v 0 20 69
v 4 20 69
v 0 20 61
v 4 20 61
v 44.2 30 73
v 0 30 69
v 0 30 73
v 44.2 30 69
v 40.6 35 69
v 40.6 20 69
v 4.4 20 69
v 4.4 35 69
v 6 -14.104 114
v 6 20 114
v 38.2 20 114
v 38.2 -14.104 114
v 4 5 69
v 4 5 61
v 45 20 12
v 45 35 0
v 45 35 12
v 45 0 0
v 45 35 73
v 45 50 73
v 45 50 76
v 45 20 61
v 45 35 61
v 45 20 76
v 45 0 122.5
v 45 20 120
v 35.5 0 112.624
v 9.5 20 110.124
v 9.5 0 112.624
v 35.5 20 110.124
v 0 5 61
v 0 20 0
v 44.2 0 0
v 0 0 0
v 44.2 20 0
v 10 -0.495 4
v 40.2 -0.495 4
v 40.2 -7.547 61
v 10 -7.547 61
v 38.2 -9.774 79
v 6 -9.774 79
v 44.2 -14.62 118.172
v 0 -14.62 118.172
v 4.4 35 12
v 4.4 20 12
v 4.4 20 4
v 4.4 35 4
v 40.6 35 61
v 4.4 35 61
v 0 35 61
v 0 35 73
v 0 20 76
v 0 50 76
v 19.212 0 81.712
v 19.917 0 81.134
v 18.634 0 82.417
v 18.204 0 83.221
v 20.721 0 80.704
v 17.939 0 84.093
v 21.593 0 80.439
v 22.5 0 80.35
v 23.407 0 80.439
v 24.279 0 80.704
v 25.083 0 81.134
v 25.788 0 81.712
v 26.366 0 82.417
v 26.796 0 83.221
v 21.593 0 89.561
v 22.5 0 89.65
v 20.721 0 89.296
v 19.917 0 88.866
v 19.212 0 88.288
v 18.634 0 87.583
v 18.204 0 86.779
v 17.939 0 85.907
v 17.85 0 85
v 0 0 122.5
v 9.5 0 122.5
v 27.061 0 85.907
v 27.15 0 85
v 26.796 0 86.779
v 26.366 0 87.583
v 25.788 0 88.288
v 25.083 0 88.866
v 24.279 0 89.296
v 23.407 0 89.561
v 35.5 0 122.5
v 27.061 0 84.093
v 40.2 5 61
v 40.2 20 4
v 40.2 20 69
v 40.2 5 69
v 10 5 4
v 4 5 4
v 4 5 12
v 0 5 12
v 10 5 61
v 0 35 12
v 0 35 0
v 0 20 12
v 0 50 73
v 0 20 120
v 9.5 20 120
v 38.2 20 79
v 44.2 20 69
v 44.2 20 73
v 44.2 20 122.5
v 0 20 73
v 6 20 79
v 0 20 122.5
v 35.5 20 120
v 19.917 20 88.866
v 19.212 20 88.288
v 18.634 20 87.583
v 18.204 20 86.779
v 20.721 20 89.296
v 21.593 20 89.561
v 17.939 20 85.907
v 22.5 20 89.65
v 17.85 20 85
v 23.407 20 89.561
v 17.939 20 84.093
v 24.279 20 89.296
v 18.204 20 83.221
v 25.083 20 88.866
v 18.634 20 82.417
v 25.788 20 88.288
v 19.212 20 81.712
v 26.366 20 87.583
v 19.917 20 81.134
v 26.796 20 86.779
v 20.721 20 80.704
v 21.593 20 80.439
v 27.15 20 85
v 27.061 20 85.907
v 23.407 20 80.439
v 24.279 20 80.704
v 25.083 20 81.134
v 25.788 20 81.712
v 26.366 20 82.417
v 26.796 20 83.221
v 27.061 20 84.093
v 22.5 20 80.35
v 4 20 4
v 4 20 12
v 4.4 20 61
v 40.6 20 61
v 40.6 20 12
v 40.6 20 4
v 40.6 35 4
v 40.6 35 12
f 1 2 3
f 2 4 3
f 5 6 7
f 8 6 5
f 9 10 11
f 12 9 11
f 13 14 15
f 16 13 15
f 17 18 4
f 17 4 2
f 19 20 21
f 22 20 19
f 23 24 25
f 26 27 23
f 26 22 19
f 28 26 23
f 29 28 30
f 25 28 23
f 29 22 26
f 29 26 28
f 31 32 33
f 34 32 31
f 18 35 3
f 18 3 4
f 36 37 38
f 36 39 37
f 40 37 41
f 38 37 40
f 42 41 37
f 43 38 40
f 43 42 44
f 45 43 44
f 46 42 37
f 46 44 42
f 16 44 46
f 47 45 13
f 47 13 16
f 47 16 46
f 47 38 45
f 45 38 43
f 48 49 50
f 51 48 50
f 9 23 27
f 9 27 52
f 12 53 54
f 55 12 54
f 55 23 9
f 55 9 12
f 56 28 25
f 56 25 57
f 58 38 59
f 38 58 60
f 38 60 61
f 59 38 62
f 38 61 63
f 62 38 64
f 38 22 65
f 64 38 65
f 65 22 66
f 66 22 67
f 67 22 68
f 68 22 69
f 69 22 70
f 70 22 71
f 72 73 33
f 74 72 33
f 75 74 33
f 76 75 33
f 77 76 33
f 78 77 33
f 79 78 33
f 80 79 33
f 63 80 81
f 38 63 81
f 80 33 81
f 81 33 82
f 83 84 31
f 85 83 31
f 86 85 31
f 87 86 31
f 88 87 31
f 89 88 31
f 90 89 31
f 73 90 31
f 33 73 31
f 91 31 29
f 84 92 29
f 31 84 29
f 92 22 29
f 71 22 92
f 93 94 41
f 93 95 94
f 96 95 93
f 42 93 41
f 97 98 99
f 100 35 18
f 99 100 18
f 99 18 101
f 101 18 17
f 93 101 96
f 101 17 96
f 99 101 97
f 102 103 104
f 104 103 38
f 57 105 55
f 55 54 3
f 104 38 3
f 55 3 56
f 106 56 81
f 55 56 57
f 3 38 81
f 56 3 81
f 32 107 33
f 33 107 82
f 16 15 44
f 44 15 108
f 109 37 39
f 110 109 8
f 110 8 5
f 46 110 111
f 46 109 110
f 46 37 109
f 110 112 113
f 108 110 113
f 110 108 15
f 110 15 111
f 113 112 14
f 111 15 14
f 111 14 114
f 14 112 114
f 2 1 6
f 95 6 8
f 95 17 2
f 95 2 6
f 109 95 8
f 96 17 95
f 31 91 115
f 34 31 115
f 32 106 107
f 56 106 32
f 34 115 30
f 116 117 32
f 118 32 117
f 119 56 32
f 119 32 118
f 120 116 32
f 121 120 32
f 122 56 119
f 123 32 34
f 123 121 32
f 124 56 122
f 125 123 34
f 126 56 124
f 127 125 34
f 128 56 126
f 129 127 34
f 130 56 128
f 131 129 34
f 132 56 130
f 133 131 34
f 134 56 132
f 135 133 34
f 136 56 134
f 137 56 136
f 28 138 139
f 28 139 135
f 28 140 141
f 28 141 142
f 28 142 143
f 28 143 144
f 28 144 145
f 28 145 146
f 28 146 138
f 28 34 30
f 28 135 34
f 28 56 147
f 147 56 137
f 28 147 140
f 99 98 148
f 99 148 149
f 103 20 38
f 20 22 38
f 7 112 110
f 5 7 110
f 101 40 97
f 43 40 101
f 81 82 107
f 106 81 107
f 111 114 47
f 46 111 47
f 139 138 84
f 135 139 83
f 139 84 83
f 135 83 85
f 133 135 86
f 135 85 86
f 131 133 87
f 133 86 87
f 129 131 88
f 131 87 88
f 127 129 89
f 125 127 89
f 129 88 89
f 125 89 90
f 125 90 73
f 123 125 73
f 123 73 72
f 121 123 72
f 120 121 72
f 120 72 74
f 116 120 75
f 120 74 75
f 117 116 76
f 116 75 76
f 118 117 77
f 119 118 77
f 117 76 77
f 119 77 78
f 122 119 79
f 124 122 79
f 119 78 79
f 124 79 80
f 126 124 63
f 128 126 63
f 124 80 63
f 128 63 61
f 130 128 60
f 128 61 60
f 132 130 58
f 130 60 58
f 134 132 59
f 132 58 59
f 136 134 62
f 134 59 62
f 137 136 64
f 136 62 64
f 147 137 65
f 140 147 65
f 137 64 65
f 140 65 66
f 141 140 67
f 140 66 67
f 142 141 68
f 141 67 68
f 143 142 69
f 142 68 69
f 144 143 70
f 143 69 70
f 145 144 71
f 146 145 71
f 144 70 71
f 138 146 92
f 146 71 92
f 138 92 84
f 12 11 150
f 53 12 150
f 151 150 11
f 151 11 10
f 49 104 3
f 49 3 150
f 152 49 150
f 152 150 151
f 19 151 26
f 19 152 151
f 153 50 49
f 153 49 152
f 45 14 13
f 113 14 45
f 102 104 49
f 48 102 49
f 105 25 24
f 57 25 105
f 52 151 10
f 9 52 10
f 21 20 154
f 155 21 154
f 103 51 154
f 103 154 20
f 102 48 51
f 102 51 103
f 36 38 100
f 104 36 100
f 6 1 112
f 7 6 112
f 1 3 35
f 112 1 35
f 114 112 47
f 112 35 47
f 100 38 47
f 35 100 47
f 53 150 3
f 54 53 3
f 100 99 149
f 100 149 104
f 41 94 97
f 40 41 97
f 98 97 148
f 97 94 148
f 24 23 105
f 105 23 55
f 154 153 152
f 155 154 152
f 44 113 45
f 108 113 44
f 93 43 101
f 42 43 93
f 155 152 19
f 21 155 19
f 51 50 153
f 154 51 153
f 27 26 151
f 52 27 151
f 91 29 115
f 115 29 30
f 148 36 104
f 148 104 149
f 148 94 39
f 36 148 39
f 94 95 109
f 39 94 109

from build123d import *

# Parameters (mm, degrees)
SKETCH_W        = 45
SKETCH_H        = 20
PAD_DEPTH       = 120
PAD001_DEPTH    = 45
SKETCH002_R     = 4.65
POCKET_DEPTH    = 20
PAD002_DEPTH    = 15
PAD003_DEPTH    = 15
POCKET001_DEPTH = 9.8
SKETCH019_W     = 45
SKETCH019_H     = 3
PAD016_DEPTH    = 30
SKETCH005_W     = 10
SKETCH005_H     = 73
PAD004_DEPTH    = 5
PAD005_DEPTH    = 15
PAD006_DEPTH    = 5
PAD007_DEPTH    = 15
PAD008_DEPTH    = 5
SKETCH008_W     = 44.2
SKETCH008_H     = 4
PAD009_DEPTH    = 10
SKETCH009_W     = 30.2
SKETCH009_H     = 5
PAD010_DEPTH    = 8
SKETCH011_W     = 4
SKETCH011_H     = 5
PAD011_DEPTH    = 49
SKETCH013_W     = 4
SKETCH013_H     = 15
PAD012_DEPTH    = 49
SKETCH014_W     = 44.2
SKETCH014_H     = 20
PAD013_DEPTH    = 47
PAD014_DEPTH    = 44.2
PAD015_DEPTH    = 44.2
SKETCH017_W     = 30.2
SKETCH017_H     = 57
POCKET002_DEPTH = 10
SKETCH018_W     = 32.2
SKETCH018_H     = 35
POCKET003_DEPTH = 50


with BuildPart() as body:
    # Sketch → Pad (new body)
    with BuildSketch(Plane.XY):
        with Locations((22.5, 10)):
            Rectangle(SKETCH_W, SKETCH_H)
    extrude(amount=PAD_DEPTH)

    # Sketch001 (on Face2 of Pad) → Pad001 (join)
    with BuildSketch(Plane.YZ.offset(45)):
        Polygon((0, 120), (0, 122.5), (20, 120), align=None)
    extrude(amount=-PAD001_DEPTH)

    # Sketch002 (on Face6 of Pad001) → Pocket (cut)
    with BuildSketch(Plane.XZ):
        with Locations((22.5, 85)):
            Circle(SKETCH002_R)
    extrude(amount=-POCKET_DEPTH, mode=Mode.SUBTRACT)

    # Sketch003 (on Face1 of Pocket) → Pad002 (join)
    with BuildSketch(Plane(origin=(0, 20, 0), x_dir=(-1, 0, 0), z_dir=(0, 1, 0))):
        Polygon((-4.4, 4), (-40.6, 4), (-40.6, 12), (-45, 12), (-45, 0), (0, 0), (0, 12), (-4.4, 12), align=None)
    extrude(amount=PAD002_DEPTH)

    # Sketch004 (on Face1 of Pad002) → Pad003 (join)
    with BuildSketch(Plane(origin=(0, 20, 0), x_dir=(-1, 0, 0), z_dir=(0, 1, 0))):
        Polygon((0, 73), (-45, 73), (-45, 61), (-40.6, 61), (-40.6, 69), (-4.4, 69), (-4.4, 61), (0, 61), align=None)
    extrude(amount=PAD003_DEPTH)

    # Sketch010 (on Face27 of Pad003) → Pocket001 (cut)
    with BuildSketch(Plane(origin=(0, 15.0769230769, 120.6153846154), x_dir=(1, 0, 0), z_dir=(0, 0.1240347346, 0.9922778767))):
        Polygon((9.5, 4.9613893836), (9.5, -15.1942549872), (35.5, -15.1942549872), (35.5, 4.9613893836), (35.5, 6.9613893836), (9.5, 6.9613893836), align=None)
    extrude(amount=-POCKET001_DEPTH, mode=Mode.SUBTRACT)

    # Sketch019 (on Face17 of Pocket001) → Pad016 (join)
    with BuildSketch(Plane(origin=(0, 20, 0), x_dir=(-1, 0, 0), z_dir=(0, 1, 0))):
        with Locations((-22.5, 74.5)):
            Rectangle(SKETCH019_W, SKETCH019_H)
    extrude(amount=PAD016_DEPTH)


with BuildPart() as batteryrearmotorholder001:
    # Sketch005 → Pad004 (new body)
    with BuildSketch(Plane.XZ):
        with Locations((5, 36.5)):
            Rectangle(SKETCH005_W, SKETCH005_H)
    extrude(amount=-PAD004_DEPTH)

    # Sketch006 (on Face6 of Pad004) → Pad005 (join)
    with BuildSketch(Plane(origin=(0, 5, 0), x_dir=(1, 0, 0), z_dir=(0, 1, 0))):
        Polygon((0, 0), (10, 0), (44.2, 0), (44.2, -12), (40.2, -12), (40.2, -4), (4, -4), (4, -12), (0, -12), align=None)
    extrude(amount=PAD005_DEPTH)

    # Sketch006 (on Face6 of Pad004) → Pad006 (join)
    with BuildSketch(Plane(origin=(0, 5, 0), x_dir=(1, 0, 0), z_dir=(0, 1, 0))):
        Polygon((0, 0), (10, 0), (44.2, 0), (44.2, -12), (40.2, -12), (40.2, -4), (4, -4), (4, -12), (0, -12), align=None)
    extrude(amount=-PAD006_DEPTH)

    # Sketch007 (on Face6 of Pad004) → Pad007 (join)
    with BuildSketch(Plane(origin=(0, 5, 0), x_dir=(1, 0, 0), z_dir=(0, 1, 0))):
        Polygon((0, -73), (0, -61), (4, -61), (4, -69), (40.2, -69), (40.2, -61), (44.2, -61), (44.2, -73), align=None)
    extrude(amount=PAD007_DEPTH)

    # Sketch007 (on Face6 of Pad004) → Pad008 (join)
    with BuildSketch(Plane(origin=(0, 5, 0), x_dir=(1, 0, 0), z_dir=(0, 1, 0))):
        Polygon((0, -73), (0, -61), (4, -61), (4, -69), (40.2, -69), (40.2, -61), (44.2, -61), (44.2, -73), align=None)
    extrude(amount=-PAD008_DEPTH)

    # Sketch008 (on Face33 of Pad008) → Pad009 (join)
    with BuildSketch(Plane(origin=(0, 20, 0), x_dir=(1, 0, 0), z_dir=(0, 1, 0))):
        with Locations((22.1, -71)):
            Rectangle(SKETCH008_W, SKETCH008_H)
    extrude(amount=PAD009_DEPTH)

    # Sketch009 (on Face32 of Pad009) → Pad010 (join)
    with BuildSketch(Plane(origin=(0, 0, 69), x_dir=(1, 0, 0), z_dir=(0, 0, -1))):
        with Locations((25.1, -2.5)):
            Rectangle(SKETCH009_W, SKETCH009_H)
    extrude(amount=PAD010_DEPTH)

    # Sketch011 (on Face16 of Pad009) → Pad011 (join)
    with BuildSketch(Plane(origin=(0, 0, 12), x_dir=(-1, 0, 0), z_dir=(0, 0, 1))):
        with Locations((-42.2, -2.5)):
            Rectangle(SKETCH011_W, SKETCH011_H)
    extrude(amount=PAD011_DEPTH)

    # Sketch013 (on Face45 of Pad011) → Pad012 (join)
    with BuildSketch(Plane(origin=(0, 0, 61), x_dir=(1, 0, 0), z_dir=(0, 0, -1))):
        with Locations((42.2, -12.5)):
            Rectangle(SKETCH013_W, SKETCH013_H)
    extrude(amount=PAD012_DEPTH)

    # Sketch014 (on Face44 of Pad012) → Pad013 (join)
    with BuildSketch(Plane(origin=(0, 0, 73), x_dir=(-1, 0, 0), z_dir=(0, 0, 1))):
        with Locations((-22.1, -10)):
            Rectangle(SKETCH014_W, SKETCH014_H)
    extrude(amount=PAD013_DEPTH)

    # Sketch015 (on Face33 of Pad013) → Pad014 (join)
    with BuildSketch(Plane(origin=(0, 0, 0), x_dir=(0, 0, -1), z_dir=(-1, 0, 0))):
        Polygon((-120, 0), (-120, -20), (-122.5, -20), align=None)
    extrude(amount=-PAD014_DEPTH)

    # Sketch016 (on Face33 of Pad014) → Pad015 (join)
    with BuildSketch(Plane(origin=(0, 0, 0), x_dir=(0, 0, -1), z_dir=(-1, 0, 0))):
        Polygon((-120, 0), (0, 0), (-118.1725, 14.62), align=None)
    extrude(amount=-PAD015_DEPTH)

    # Sketch017 (on Face48 of Pad015) → Pocket002 (cut)
    with BuildSketch(Plane(origin=(0, 0, 0), x_dir=(1, 0, 0), z_dir=(0, 1, 0))):
        with Locations((25.1, -32.5)):
            Rectangle(SKETCH017_W, SKETCH017_H)
    extrude(amount=-POCKET002_DEPTH, mode=Mode.SUBTRACT)

    # Sketch018 (on Face36 of Pocket002) → Pocket003 (cut)
    with BuildSketch(Plane(origin=(0, 20, 0), x_dir=(1, 0, 0), z_dir=(0, 1, 0))):
        with Locations((22.1, -96.5)):
            Rectangle(SKETCH018_W, SKETCH018_H)
    extrude(amount=-POCKET003_DEPTH, mode=Mode.SUBTRACT)


solid = Compound([body.part, batteryrearmotorholder001.part])
